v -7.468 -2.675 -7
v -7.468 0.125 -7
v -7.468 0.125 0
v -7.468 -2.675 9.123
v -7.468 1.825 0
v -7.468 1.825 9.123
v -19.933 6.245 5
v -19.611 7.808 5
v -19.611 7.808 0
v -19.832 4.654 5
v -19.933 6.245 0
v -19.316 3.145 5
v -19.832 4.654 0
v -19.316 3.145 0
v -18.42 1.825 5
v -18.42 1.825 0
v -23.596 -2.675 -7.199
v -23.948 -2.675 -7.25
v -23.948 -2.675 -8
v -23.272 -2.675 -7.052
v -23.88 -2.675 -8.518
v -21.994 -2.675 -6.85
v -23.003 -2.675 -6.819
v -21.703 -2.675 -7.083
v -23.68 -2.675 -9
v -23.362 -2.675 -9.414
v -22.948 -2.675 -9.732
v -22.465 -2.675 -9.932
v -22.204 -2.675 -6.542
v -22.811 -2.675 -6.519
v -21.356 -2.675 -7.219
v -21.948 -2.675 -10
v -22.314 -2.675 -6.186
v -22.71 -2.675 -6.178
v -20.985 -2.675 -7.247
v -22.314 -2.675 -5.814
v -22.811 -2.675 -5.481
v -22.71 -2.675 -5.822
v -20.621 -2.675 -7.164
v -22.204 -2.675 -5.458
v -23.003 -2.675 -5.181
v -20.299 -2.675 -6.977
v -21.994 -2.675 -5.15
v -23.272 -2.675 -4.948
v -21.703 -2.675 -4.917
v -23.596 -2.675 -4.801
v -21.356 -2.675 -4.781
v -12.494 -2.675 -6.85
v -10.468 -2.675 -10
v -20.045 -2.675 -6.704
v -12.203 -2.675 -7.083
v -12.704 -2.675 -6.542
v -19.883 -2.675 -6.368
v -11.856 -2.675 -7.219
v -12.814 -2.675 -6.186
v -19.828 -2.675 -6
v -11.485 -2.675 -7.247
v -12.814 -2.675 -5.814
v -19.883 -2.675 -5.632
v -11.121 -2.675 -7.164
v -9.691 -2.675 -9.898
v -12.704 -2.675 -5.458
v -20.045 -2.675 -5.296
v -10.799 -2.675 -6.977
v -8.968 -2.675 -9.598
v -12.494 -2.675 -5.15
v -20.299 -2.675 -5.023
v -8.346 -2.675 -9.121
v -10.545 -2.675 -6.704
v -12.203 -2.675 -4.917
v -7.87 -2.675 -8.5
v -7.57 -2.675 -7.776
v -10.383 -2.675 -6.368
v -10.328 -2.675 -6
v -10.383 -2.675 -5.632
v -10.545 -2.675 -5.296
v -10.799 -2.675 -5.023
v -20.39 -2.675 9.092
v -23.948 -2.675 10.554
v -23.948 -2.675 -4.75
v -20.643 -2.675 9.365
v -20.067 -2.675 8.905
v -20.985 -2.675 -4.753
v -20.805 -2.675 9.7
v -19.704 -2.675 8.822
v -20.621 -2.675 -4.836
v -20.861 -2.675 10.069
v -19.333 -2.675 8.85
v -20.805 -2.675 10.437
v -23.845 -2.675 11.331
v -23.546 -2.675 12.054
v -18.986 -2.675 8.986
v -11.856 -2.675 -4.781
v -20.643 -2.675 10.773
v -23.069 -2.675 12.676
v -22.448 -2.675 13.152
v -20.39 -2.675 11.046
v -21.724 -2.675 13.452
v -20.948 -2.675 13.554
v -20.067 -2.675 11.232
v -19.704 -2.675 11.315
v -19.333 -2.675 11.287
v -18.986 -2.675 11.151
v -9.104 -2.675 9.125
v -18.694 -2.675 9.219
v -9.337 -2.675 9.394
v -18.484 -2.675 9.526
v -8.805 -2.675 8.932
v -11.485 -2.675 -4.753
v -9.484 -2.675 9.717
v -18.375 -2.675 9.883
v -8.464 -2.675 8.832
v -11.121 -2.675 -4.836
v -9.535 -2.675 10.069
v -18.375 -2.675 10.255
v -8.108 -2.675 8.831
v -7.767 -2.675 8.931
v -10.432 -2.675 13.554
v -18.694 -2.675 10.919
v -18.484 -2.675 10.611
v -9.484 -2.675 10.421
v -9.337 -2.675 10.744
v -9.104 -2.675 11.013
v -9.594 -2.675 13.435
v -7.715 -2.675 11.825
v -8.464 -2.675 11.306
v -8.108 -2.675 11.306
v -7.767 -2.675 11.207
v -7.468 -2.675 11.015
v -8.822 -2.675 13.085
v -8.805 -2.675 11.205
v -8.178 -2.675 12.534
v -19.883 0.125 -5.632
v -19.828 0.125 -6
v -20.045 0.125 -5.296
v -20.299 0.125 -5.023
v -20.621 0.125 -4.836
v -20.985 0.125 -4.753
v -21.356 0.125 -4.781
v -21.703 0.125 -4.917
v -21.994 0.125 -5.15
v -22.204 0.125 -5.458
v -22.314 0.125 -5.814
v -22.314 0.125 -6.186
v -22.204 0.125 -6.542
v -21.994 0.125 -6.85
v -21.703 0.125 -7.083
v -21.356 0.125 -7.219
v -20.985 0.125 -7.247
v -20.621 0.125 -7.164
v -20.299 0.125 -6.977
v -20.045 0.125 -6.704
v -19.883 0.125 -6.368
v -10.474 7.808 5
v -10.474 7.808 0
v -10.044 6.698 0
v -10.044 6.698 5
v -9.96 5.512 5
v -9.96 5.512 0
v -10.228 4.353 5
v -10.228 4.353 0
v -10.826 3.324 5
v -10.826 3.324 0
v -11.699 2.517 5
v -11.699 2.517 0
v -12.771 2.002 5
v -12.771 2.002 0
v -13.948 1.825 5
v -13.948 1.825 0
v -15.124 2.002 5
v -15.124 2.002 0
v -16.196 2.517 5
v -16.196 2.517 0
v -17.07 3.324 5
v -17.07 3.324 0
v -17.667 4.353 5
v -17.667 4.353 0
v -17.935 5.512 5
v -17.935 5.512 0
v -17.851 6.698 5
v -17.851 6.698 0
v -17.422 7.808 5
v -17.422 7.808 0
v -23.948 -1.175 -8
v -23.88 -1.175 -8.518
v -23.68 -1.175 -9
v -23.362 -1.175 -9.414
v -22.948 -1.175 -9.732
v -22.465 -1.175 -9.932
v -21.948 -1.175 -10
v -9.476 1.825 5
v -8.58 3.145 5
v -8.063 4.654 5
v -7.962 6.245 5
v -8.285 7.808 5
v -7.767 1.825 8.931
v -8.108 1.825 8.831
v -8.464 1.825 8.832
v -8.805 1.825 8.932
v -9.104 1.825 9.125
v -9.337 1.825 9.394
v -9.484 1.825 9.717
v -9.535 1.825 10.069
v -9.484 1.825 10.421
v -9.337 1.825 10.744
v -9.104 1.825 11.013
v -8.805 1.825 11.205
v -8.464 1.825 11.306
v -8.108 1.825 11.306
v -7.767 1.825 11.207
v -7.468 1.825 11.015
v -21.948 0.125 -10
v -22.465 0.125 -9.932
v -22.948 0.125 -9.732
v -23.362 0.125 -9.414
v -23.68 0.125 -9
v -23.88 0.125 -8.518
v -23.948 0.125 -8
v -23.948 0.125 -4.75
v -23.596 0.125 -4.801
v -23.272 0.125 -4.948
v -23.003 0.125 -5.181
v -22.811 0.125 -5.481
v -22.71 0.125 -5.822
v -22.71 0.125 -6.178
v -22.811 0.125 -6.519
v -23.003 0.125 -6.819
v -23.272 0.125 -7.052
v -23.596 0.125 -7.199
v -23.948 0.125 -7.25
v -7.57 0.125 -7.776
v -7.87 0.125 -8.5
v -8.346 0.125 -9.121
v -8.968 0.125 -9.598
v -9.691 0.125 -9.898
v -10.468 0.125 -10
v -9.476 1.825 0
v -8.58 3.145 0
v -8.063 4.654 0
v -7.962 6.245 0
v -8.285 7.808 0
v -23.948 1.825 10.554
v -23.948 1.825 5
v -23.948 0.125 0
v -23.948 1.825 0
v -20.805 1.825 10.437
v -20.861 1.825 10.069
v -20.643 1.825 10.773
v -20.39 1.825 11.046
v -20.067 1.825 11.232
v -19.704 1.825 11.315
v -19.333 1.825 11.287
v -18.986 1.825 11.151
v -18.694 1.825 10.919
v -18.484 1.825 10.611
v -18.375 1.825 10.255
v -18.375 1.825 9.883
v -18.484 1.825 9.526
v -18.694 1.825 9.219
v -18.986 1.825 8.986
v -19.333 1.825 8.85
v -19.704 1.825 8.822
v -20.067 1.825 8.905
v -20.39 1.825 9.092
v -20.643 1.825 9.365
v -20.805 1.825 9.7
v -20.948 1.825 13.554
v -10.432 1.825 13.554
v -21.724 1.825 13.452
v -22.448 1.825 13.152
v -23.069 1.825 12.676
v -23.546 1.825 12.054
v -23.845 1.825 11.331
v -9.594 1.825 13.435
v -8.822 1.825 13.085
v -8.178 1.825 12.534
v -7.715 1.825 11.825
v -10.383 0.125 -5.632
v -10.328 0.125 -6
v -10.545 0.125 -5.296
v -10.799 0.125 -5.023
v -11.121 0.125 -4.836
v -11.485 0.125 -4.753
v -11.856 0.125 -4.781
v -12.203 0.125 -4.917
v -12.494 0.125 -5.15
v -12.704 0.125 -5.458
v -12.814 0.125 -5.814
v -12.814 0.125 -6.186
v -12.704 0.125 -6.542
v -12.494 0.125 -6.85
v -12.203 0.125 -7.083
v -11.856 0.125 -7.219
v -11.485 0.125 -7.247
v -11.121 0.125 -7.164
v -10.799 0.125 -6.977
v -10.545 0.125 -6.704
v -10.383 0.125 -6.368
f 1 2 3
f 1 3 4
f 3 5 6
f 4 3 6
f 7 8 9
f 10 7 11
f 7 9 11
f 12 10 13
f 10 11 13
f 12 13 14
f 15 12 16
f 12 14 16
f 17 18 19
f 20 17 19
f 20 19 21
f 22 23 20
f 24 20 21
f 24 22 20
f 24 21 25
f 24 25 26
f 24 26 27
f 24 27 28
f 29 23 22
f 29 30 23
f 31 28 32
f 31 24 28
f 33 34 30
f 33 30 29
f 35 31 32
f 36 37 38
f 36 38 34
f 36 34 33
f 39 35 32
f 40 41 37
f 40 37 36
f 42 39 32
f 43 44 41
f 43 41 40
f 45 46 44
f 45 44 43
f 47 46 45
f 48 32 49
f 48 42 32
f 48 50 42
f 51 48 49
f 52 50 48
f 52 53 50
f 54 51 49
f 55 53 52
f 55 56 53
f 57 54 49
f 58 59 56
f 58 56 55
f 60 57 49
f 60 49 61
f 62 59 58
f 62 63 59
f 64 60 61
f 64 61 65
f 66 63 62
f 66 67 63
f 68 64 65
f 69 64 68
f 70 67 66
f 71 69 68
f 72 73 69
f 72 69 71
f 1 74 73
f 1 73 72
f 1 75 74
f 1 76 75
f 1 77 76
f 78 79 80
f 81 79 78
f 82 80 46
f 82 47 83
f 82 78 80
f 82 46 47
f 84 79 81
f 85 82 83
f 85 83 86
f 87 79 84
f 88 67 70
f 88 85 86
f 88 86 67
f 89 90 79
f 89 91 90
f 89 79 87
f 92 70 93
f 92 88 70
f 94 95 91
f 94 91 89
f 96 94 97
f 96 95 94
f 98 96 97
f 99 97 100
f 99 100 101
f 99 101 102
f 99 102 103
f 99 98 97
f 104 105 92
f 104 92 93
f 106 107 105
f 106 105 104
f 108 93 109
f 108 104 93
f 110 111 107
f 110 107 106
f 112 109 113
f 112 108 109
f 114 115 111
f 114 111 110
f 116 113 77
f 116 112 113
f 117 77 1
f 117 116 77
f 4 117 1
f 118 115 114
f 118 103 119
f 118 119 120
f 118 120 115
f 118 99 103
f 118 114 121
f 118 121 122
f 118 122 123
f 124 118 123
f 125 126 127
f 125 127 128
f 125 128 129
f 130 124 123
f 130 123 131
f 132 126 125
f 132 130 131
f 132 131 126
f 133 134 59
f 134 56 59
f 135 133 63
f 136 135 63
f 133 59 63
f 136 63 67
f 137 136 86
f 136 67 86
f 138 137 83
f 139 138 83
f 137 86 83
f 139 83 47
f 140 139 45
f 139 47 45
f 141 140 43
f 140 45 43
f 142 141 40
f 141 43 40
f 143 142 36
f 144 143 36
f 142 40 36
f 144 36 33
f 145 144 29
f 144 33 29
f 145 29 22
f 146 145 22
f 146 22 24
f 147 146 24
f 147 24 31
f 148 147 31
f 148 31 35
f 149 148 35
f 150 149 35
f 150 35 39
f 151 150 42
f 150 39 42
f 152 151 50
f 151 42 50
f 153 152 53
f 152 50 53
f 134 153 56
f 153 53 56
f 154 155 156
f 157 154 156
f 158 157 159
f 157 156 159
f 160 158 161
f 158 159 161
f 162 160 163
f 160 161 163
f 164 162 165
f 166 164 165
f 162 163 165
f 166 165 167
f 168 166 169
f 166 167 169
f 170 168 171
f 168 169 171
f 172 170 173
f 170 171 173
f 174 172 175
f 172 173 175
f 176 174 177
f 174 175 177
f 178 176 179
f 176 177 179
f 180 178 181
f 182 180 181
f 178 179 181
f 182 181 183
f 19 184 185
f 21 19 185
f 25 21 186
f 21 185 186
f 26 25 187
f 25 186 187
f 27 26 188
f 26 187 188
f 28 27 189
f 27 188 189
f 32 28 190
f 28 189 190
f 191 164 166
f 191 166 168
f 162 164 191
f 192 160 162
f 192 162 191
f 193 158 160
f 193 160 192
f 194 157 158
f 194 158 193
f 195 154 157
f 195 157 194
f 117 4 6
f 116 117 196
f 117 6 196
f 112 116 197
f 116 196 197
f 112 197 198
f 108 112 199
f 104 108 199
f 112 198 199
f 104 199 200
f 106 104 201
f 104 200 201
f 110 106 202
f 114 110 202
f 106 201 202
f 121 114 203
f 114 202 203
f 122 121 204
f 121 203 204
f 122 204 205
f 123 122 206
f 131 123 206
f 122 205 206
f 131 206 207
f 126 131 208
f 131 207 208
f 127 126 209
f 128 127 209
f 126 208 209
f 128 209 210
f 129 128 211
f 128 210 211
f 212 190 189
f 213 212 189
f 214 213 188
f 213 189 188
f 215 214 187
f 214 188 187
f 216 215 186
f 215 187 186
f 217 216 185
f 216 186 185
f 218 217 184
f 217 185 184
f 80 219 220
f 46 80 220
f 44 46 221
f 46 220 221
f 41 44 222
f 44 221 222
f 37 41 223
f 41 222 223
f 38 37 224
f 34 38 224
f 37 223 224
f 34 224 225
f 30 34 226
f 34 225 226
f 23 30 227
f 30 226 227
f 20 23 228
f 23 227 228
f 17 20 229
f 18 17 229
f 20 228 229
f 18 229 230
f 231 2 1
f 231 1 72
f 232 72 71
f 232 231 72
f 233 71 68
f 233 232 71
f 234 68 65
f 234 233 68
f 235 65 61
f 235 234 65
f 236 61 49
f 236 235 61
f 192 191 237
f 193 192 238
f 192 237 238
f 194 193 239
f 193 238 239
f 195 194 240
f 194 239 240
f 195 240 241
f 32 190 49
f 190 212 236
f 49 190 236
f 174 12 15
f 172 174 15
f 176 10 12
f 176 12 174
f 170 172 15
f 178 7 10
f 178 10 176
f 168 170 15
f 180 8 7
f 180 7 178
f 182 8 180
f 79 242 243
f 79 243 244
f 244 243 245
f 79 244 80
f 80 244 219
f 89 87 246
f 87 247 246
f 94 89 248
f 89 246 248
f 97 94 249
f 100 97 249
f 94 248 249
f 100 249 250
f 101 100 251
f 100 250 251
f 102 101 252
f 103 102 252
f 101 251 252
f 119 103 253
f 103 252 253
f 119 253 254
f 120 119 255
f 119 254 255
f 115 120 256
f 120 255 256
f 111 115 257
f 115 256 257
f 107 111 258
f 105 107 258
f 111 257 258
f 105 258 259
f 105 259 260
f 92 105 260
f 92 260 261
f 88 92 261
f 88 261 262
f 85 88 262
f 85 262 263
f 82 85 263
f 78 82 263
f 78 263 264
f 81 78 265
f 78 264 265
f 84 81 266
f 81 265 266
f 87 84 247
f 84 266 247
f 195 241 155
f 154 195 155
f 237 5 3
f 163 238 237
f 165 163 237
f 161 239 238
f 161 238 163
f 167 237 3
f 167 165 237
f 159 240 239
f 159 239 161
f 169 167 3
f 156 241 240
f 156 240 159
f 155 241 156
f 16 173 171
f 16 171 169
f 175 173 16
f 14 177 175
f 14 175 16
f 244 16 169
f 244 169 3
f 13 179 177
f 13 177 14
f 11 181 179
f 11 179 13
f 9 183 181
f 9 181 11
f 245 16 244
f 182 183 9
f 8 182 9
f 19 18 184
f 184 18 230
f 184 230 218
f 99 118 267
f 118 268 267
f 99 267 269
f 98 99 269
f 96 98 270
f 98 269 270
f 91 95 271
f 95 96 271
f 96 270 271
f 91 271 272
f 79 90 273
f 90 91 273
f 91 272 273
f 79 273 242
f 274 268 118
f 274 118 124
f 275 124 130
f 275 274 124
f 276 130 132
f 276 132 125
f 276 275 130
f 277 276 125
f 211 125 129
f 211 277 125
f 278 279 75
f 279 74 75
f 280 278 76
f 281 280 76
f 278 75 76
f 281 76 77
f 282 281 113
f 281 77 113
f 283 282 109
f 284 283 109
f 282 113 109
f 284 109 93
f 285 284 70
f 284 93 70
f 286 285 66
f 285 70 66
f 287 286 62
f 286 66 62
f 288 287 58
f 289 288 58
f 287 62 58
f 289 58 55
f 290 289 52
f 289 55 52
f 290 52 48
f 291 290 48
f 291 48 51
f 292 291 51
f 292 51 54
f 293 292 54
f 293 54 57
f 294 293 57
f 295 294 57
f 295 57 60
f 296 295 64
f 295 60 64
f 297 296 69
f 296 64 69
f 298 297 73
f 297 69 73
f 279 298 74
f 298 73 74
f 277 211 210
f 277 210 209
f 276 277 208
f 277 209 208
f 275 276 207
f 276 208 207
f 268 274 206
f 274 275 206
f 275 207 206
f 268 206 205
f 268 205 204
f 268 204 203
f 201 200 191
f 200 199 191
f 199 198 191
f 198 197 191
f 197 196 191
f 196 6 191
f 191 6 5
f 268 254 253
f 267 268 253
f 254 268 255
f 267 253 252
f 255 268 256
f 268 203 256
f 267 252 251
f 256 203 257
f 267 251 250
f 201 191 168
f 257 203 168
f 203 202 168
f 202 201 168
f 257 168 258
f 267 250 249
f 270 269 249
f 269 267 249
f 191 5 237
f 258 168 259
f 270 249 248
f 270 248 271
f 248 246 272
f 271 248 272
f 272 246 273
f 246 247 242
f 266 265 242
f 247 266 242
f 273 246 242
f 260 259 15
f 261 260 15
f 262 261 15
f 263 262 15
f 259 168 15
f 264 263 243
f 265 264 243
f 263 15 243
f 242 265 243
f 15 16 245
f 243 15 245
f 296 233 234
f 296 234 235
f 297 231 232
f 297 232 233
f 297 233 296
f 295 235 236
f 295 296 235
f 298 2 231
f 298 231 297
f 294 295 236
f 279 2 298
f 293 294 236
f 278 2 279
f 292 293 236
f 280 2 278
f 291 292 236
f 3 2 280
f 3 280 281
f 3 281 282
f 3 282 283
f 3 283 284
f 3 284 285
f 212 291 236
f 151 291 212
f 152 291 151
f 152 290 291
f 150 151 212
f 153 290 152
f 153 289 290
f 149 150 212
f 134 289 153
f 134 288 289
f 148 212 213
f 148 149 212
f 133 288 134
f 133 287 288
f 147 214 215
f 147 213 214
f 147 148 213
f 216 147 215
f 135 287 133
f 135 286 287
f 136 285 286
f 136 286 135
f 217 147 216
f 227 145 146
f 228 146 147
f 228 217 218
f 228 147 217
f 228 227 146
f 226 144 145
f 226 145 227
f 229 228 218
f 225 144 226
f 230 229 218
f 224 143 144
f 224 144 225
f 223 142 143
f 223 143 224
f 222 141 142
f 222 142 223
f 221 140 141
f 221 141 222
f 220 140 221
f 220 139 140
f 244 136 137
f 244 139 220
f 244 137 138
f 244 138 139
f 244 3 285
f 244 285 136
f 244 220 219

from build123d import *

# Parameters (mm, degrees)
F1_DEPTH     = 20
F3_DEPTH     = 10
F4_R         = 1.25
F5_DEPTH     = 2.2
F7_DEPTH     = 10
F9_R         = 1.25
F10_DEPTH    = 28.001
F11_R        = 2
F14_DEPTH    = 1.5
F16_W        = 20
F16_H        = 10
F17_DEPTH    = 26.7
F19_R        = 1.25
F20_DEPTH    = 32.1
F22_W        = 20
F22_H        = 9.2705127583
F23_DEPTH    = 6.9
F24_DEPTH    = 2.9
F25_R        = 1.25
F26_DEPTH    = 12.5
F27_W        = 15.1660433039
F27_H        = 51.5122525394
F28_DEPTH    = 40.7
F29_W        = 35.2513279067
F29_H        = 19.1500885412
F30_DEPTH    = 12.5
F31_T1_DEPTH = 17.8
F31_T3_DEPTH = 19.5
F31_T5_DEPTH = 19.3219931649


# Not quite as in the source:
# - a fillet or chamfer that OpenCascade refuses, or shapes differently, is made with other operations: its cross-section is extruded or revolved along the edge and cut away or added


with BuildPart() as f1:
    # F0 (on Top) → F1 (new body)
    with BuildSketch(Plane.XY):
        with BuildLine():
            Line((-17.4218026286, 7.8075558554), (-19.6106751933, 7.8075558554))
            ThreePointArc((-19.6106751933, 7.8075558554), (-13.947676921, -0.1749805422), (-8.2846786486, 7.8075558554))
            Line((-8.2846786486, 7.8075558554), (-10.4735512133, 7.8075558554))
            ThreePointArc((-10.4735512133, 7.8075558554), (-13.947676921, 1.8250194578), (-17.4218026286, 7.8075558554))
        make_face()
    extrude(amount=F1_DEPTH)

    # F2 (on Top) → F3 (join, symmetric)
    with BuildSketch(Plane.XY):
        Polygon((-3.947676921, 1.8250194578), (-13.947676921, 1.8250194578), (-23.947676921, 1.8250194578), (-23.947676921, -1.1749805422), (-3.947676921, -1.1749805422), align=None)
    extrude(amount=F3_DEPTH, both=True)

    # F4 (on Front) → F5 (cut, symmetric)
    with BuildSketch(Plane.XZ):
        with Locations((-11.5779312328, -6)):
            Circle(F4_R)
        with Locations((-21.0779312328, -6)):
            Circle(F4_R)
    extrude(amount=F5_DEPTH, both=True, mode=Mode.SUBTRACT)

    # F6 (on face) → F7 (join, through all)
    with BuildSketch(Plane.XY.offset(10)):
        with BuildLine():
            Line((-3.947676921, 1.8250194578), (-9.475540966, 1.8250194578))
            ThreePointArc((-9.475540966, 1.8250194578), (-13.947676921, -0.1749805422), (-18.419812876, 1.8250194578))
            Line((-18.419812876, 1.8250194578), (-23.947676921, 1.8250194578))
            Line((-23.947676921, 1.8250194578), (-23.947676921, -1.1749805422))
            Line((-23.947676921, -1.1749805422), (-3.947676921, -1.1749805422))
            Line((-3.947676921, -1.1749805422), (-3.947676921, 1.8250194578))
        make_face()
    extrude(amount=F7_DEPTH)

    # F9 (on offset) → F10 (cut, through all)
    with BuildSketch(Plane(origin=(0, 26.8250194578, 0), x_dir=(-1, 0, 0), z_dir=(0, 1, 0))):
        with Locations((23.947676921, -6)):
            Circle(F9_R)
        with Locations((3.947676921, -6)):
            Circle(F9_R)
    extrude(amount=-F10_DEPTH, mode=Mode.SUBTRACT)

    # F11
    f11_edges = [f1.edges().sort_by_distance(p)[0] for p in [
        (-23.947677, 0.325019, -10),
        (-3.947677, 0.325019, -10),
    ]]
    fillet(f11_edges, radius=F11_R)

    # F13 (on offset) → F14 (join)
    with BuildSketch(Plane.XZ.offset(1.1749805422)):
        with BuildLine():
            ThreePointArc((-23.947676921, -4.75), (-22.697676921, -6), (-23.947676921, -7.25))
            Line((-23.947676921, -7.25), (-23.947676921, -8))
            ThreePointArc((-23.947676921, -8), (-23.3618904833, -9.4142135624), (-21.947676921, -10))
            Line((-21.947676921, -10), (-5.947676921, -10))
            ThreePointArc((-5.947676921, -10), (-4.5334633586, -9.4142135624), (-3.947676921, -8))
            Line((-3.947676921, -8), (-3.947676921, -7.25))
            ThreePointArc((-3.947676921, -7.25), (-5.197676921, -6), (-3.947676921, -4.75))
            Line((-3.947676921, -4.75), (-3.947676921, 20))
            Line((-3.947676921, 20), (-23.947676921, 20))
            Line((-23.947676921, 20), (-23.947676921, -4.75))
        make_face()
    extrude(amount=F14_DEPTH)

    # F16 (on offset) → F17 (cut)
    with BuildSketch(Plane(origin=(0, 26.8250194578, 0), x_dir=(-1, 0, 0), z_dir=(0, 1, 0))):
        with Locations((13.947676921, -5)):
            Rectangle(F16_W, F16_H)
    extrude(amount=-F17_DEPTH, mode=Mode.SUBTRACT)

    # F19 (on offset) → F20 (cut)
    with BuildSketch(Plane.XZ.offset(25)):
        with Locations((-11.5779312328, -6)):
            Circle(F19_R)
        with Locations((-21.0779312328, -6)):
            Circle(F19_R)
    extrude(amount=-F20_DEPTH, mode=Mode.SUBTRACT)

    # F22 (on offset) → F23 (cut)
    with BuildSketch(Plane.XY.offset(11.9)):
        with Locations((-13.947676921, 6.460275837)):
            Rectangle(F22_W, F22_H)
    extrude(amount=-F23_DEPTH, mode=Mode.SUBTRACT)

    # F22 (on offset) → F24 (cut)
    with BuildSketch(Plane.XY.offset(11.9)):
        with Locations((-13.947676921, 6.460275837)):
            Rectangle(F22_W, F22_H)
    extrude(amount=F24_DEPTH, mode=Mode.SUBTRACT)

    # F25 (on offset) → F26 (cut, symmetric)
    with BuildSketch(Plane(origin=(0, 1.8250194578, 0), x_dir=(-1, 0, 0), z_dir=(0, 1, 0))):
        with Locations((8.2846786486, 10.0688289385)):
            Circle(F25_R)
        with Locations((19.6106751933, 10.0688289385)):
            Circle(F25_R)
    extrude(amount=F26_DEPTH, both=True, mode=Mode.SUBTRACT)

    # F27 (on offset) → F28 (cut)
    with BuildSketch(Plane(origin=(0, 26.8250194578, 0), x_dir=(-1, 0, 0), z_dir=(0, 1, 0))):
        with Locations((-0.11521345, 4.9743577838)):
            Rectangle(F27_W, F27_H)
    extrude(amount=-F28_DEPTH, mode=Mode.SUBTRACT)

    # F29 (on face) → F30 (cut, symmetric)
    with BuildSketch(Plane(origin=(0, 1.8250194578, 0), x_dir=(-1, 0, 0), z_dir=(0, 1, 0))):
        with Locations((16.3581850356, 23.1292308308)):
            Rectangle(F29_W, F29_H)
    extrude(amount=F30_DEPTH, both=True, mode=Mode.SUBTRACT)

    # F31: fillet of radius 3 on 3 edges, made by hand

    # F31_s2 → F31_t1 (cut)
    with BuildSketch(Plane.XZ.offset(-7.6250194578)):
        with BuildLine():
            ThreePointArc((-7.4678082019, -7), (-8.3464878583, -9.1213203436), (-10.4678082019, -10))
            Line((-10.4678082019, -10), (-7.4678082019, -10))
            Line((-7.4678082019, -10), (-7.4678082019, -7))
        make_face()
    extrude(amount=F31_T1_DEPTH, mode=Mode.SUBTRACT)

    # F31_s4 → F31_t3 (cut)
    with BuildSketch(Plane.XZ.offset(-9.3250194578)):
        with BuildLine():
            ThreePointArc((-20.947676921, 13.5541865602), (-23.0689972645, 12.6755069038), (-23.947676921, 10.5541865602))
            Line((-23.947676921, 10.5541865602), (-23.947676921, 13.5541865602))
            Line((-23.947676921, 13.5541865602), (-20.947676921, 13.5541865602))
        make_face()
    extrude(amount=F31_T3_DEPTH, mode=Mode.SUBTRACT)

    # F31_s6 → F31_t5 (cut)
    with BuildSketch(Plane.XZ.offset(-9.2360160403)):
        with BuildLine():
            ThreePointArc((-10.4322068349, 13.5541865602), (-8.4805938304, 12.8326085319), (-7.4678082019, 11.0149910141))
            Line((-7.4678082019, 11.0149910141), (-7.4678082019, 13.5541865602))
            Line((-7.4678082019, 13.5541865602), (-10.4322068349, 13.5541865602))
        make_face()
    extrude(amount=F31_T5_DEPTH, mode=Mode.SUBTRACT)


solid = f1.part
